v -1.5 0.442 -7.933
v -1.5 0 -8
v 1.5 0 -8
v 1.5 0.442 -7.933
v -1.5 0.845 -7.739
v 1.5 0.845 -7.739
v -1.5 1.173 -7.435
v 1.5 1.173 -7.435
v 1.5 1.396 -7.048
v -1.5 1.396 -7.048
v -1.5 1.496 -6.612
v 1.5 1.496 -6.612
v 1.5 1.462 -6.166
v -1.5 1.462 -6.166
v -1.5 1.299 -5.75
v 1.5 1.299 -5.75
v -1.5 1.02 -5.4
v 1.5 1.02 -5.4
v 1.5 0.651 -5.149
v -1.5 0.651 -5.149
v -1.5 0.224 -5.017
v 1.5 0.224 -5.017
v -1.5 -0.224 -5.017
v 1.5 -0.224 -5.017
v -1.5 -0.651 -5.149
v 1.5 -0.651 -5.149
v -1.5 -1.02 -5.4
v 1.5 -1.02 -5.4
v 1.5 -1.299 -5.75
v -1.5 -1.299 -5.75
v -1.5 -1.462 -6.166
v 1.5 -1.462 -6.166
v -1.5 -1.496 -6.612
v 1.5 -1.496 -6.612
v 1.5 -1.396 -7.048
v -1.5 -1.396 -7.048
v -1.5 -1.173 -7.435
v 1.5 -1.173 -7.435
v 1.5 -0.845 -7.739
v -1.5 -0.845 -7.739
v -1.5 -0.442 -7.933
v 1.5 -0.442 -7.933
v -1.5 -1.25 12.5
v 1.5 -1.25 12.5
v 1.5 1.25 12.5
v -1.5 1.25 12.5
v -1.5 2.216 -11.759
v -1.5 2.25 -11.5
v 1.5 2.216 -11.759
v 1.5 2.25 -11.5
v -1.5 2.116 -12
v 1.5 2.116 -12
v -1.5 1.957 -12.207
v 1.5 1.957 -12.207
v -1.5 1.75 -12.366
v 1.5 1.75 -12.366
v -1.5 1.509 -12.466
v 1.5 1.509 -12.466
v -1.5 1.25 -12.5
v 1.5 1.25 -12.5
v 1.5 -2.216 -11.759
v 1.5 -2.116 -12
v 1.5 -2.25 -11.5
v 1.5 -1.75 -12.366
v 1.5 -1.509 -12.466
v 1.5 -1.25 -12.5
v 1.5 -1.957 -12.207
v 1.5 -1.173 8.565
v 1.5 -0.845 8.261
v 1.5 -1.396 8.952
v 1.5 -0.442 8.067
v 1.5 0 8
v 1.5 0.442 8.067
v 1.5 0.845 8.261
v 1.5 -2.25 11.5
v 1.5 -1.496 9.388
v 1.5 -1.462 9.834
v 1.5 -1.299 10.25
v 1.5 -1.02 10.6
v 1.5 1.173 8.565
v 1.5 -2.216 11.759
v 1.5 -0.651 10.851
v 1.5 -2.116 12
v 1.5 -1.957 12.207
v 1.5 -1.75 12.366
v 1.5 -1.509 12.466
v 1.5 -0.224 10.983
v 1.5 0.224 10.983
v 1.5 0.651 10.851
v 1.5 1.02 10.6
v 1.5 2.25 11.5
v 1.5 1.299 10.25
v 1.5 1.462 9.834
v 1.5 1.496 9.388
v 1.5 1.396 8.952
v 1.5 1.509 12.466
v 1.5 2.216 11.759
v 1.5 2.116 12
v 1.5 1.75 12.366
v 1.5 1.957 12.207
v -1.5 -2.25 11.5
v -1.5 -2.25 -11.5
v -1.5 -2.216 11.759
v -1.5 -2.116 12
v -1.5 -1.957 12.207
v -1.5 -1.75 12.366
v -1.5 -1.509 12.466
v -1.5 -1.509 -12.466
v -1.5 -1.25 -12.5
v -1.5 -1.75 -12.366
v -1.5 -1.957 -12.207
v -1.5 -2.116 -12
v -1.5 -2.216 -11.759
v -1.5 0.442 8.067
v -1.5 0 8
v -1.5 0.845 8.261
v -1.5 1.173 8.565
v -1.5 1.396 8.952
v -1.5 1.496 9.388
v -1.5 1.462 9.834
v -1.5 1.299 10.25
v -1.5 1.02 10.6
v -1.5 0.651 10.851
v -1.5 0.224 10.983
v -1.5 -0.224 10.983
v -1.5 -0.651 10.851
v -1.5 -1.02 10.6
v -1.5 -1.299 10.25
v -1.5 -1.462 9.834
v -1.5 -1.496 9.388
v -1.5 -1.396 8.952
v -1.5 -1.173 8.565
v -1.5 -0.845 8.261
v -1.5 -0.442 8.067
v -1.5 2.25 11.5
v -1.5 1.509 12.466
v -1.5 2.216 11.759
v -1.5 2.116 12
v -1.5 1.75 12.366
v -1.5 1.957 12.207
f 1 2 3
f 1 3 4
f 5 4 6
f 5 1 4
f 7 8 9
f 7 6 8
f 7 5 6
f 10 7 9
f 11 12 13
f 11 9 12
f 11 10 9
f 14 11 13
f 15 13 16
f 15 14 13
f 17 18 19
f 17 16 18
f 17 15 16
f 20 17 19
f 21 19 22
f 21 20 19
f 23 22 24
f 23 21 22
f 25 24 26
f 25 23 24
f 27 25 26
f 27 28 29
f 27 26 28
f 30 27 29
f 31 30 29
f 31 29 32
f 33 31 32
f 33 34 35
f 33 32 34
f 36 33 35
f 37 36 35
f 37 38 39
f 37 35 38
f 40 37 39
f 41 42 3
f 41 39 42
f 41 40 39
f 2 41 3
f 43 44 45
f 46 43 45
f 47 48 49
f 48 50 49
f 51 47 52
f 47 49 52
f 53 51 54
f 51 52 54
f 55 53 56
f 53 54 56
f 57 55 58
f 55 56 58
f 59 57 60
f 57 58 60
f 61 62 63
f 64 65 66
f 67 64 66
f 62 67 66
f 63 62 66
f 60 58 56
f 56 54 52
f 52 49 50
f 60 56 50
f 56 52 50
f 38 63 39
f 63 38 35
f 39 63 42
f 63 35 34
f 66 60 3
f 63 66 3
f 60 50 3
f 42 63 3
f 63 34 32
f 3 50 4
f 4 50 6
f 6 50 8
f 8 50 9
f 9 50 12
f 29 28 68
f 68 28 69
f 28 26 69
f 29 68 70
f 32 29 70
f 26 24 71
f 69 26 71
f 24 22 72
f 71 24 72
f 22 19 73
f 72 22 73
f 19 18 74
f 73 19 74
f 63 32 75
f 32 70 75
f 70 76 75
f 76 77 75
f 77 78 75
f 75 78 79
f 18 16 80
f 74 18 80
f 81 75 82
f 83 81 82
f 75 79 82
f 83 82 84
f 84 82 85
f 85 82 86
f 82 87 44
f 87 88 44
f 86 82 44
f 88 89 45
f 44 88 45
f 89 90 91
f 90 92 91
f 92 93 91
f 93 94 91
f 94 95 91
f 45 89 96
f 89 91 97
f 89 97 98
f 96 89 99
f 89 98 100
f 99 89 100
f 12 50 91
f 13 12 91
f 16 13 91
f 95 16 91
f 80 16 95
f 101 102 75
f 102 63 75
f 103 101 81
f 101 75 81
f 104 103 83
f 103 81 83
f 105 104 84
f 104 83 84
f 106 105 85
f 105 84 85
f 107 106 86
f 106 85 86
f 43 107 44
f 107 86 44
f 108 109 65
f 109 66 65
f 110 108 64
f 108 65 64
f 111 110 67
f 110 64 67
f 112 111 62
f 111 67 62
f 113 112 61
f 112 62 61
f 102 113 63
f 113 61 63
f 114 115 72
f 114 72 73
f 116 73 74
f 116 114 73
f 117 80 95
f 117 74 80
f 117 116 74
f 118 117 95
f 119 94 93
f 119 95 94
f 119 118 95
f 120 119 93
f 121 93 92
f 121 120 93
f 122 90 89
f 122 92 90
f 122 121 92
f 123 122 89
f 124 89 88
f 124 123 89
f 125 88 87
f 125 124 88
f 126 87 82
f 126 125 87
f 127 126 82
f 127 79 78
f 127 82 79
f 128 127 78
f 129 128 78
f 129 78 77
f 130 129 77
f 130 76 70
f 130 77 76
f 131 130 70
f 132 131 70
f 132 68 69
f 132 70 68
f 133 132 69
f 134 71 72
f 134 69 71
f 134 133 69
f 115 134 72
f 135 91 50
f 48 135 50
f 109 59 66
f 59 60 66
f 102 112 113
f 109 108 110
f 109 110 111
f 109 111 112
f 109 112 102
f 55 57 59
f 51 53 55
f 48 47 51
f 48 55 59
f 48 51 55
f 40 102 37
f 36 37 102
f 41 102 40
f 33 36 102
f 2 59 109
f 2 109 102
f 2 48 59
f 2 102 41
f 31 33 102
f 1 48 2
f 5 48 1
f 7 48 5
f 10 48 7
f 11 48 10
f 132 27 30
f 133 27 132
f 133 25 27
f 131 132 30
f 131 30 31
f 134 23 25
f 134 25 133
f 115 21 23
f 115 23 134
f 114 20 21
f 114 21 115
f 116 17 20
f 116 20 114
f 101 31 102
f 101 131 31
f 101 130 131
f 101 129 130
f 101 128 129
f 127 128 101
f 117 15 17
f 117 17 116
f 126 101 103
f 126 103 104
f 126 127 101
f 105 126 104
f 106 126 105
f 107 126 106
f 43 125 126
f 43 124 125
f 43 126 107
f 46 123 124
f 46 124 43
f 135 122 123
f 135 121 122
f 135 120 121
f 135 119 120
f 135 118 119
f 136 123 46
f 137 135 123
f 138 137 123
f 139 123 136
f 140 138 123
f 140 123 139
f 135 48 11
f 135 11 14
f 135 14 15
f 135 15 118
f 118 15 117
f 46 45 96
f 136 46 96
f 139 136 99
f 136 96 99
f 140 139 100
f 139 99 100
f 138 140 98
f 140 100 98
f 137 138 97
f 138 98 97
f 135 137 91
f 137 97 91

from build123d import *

# Parameters (mm, degrees)
SALIENTE_EXTRUIR1_DEPTH    = 1.5
CORTAR_EXTRUIR1_DEPTH      = 13.789155562
CORTAR_EXTRUIR1_DEPTH_BACK = 13.789155562
CROQUIS2_R                 = 1.5


with BuildPart() as part:
    # Croquis1 → Saliente-Extruir1 (new, symmetric)
    with BuildSketch(Plane(origin=(0, 0, 0), x_dir=(0, 0, -1), z_dir=(1, 0, 0))):
        with BuildLine():
            Line((-11.5, 2.25), (11.5, 2.25))
            ThreePointArc((11.5, 2.25), (12.207106781, 1.957106781), (12.5, 1.25))
            Line((12.5, 1.25), (12.5, -1.25))
            ThreePointArc((12.5, -1.25), (12.207106781, -1.957106781), (11.5, -2.25))
            Line((11.5, -2.25), (-11.5, -2.25))
            ThreePointArc((-11.5, -2.25), (-12.207106781, -1.957106781), (-12.5, -1.25))
            Line((-12.5, -1.25), (-12.5, 1.25))
            ThreePointArc((-12.5, 1.25), (-12.207106781, 1.957106781), (-11.5, 2.25))
        make_face()
    extrude(amount=SALIENTE_EXTRUIR1_DEPTH, both=True)

    # Croquis2 → Cortar-Extruir1 (cut, two sides: drawn at the far end of the back side and taken through both)
    with BuildSketch(Plane(origin=(0, 0, 0), x_dir=(0, 0, -1), z_dir=(1, 0, 0)).offset(-CORTAR_EXTRUIR1_DEPTH_BACK)):
        with Locations((-9.5, 0)):
            Circle(CROQUIS2_R)
        with Locations((6.5, 0)):
            Circle(CROQUIS2_R)
    extrude(amount=CORTAR_EXTRUIR1_DEPTH + CORTAR_EXTRUIR1_DEPTH_BACK, mode=Mode.SUBTRACT)


solid = part.part
